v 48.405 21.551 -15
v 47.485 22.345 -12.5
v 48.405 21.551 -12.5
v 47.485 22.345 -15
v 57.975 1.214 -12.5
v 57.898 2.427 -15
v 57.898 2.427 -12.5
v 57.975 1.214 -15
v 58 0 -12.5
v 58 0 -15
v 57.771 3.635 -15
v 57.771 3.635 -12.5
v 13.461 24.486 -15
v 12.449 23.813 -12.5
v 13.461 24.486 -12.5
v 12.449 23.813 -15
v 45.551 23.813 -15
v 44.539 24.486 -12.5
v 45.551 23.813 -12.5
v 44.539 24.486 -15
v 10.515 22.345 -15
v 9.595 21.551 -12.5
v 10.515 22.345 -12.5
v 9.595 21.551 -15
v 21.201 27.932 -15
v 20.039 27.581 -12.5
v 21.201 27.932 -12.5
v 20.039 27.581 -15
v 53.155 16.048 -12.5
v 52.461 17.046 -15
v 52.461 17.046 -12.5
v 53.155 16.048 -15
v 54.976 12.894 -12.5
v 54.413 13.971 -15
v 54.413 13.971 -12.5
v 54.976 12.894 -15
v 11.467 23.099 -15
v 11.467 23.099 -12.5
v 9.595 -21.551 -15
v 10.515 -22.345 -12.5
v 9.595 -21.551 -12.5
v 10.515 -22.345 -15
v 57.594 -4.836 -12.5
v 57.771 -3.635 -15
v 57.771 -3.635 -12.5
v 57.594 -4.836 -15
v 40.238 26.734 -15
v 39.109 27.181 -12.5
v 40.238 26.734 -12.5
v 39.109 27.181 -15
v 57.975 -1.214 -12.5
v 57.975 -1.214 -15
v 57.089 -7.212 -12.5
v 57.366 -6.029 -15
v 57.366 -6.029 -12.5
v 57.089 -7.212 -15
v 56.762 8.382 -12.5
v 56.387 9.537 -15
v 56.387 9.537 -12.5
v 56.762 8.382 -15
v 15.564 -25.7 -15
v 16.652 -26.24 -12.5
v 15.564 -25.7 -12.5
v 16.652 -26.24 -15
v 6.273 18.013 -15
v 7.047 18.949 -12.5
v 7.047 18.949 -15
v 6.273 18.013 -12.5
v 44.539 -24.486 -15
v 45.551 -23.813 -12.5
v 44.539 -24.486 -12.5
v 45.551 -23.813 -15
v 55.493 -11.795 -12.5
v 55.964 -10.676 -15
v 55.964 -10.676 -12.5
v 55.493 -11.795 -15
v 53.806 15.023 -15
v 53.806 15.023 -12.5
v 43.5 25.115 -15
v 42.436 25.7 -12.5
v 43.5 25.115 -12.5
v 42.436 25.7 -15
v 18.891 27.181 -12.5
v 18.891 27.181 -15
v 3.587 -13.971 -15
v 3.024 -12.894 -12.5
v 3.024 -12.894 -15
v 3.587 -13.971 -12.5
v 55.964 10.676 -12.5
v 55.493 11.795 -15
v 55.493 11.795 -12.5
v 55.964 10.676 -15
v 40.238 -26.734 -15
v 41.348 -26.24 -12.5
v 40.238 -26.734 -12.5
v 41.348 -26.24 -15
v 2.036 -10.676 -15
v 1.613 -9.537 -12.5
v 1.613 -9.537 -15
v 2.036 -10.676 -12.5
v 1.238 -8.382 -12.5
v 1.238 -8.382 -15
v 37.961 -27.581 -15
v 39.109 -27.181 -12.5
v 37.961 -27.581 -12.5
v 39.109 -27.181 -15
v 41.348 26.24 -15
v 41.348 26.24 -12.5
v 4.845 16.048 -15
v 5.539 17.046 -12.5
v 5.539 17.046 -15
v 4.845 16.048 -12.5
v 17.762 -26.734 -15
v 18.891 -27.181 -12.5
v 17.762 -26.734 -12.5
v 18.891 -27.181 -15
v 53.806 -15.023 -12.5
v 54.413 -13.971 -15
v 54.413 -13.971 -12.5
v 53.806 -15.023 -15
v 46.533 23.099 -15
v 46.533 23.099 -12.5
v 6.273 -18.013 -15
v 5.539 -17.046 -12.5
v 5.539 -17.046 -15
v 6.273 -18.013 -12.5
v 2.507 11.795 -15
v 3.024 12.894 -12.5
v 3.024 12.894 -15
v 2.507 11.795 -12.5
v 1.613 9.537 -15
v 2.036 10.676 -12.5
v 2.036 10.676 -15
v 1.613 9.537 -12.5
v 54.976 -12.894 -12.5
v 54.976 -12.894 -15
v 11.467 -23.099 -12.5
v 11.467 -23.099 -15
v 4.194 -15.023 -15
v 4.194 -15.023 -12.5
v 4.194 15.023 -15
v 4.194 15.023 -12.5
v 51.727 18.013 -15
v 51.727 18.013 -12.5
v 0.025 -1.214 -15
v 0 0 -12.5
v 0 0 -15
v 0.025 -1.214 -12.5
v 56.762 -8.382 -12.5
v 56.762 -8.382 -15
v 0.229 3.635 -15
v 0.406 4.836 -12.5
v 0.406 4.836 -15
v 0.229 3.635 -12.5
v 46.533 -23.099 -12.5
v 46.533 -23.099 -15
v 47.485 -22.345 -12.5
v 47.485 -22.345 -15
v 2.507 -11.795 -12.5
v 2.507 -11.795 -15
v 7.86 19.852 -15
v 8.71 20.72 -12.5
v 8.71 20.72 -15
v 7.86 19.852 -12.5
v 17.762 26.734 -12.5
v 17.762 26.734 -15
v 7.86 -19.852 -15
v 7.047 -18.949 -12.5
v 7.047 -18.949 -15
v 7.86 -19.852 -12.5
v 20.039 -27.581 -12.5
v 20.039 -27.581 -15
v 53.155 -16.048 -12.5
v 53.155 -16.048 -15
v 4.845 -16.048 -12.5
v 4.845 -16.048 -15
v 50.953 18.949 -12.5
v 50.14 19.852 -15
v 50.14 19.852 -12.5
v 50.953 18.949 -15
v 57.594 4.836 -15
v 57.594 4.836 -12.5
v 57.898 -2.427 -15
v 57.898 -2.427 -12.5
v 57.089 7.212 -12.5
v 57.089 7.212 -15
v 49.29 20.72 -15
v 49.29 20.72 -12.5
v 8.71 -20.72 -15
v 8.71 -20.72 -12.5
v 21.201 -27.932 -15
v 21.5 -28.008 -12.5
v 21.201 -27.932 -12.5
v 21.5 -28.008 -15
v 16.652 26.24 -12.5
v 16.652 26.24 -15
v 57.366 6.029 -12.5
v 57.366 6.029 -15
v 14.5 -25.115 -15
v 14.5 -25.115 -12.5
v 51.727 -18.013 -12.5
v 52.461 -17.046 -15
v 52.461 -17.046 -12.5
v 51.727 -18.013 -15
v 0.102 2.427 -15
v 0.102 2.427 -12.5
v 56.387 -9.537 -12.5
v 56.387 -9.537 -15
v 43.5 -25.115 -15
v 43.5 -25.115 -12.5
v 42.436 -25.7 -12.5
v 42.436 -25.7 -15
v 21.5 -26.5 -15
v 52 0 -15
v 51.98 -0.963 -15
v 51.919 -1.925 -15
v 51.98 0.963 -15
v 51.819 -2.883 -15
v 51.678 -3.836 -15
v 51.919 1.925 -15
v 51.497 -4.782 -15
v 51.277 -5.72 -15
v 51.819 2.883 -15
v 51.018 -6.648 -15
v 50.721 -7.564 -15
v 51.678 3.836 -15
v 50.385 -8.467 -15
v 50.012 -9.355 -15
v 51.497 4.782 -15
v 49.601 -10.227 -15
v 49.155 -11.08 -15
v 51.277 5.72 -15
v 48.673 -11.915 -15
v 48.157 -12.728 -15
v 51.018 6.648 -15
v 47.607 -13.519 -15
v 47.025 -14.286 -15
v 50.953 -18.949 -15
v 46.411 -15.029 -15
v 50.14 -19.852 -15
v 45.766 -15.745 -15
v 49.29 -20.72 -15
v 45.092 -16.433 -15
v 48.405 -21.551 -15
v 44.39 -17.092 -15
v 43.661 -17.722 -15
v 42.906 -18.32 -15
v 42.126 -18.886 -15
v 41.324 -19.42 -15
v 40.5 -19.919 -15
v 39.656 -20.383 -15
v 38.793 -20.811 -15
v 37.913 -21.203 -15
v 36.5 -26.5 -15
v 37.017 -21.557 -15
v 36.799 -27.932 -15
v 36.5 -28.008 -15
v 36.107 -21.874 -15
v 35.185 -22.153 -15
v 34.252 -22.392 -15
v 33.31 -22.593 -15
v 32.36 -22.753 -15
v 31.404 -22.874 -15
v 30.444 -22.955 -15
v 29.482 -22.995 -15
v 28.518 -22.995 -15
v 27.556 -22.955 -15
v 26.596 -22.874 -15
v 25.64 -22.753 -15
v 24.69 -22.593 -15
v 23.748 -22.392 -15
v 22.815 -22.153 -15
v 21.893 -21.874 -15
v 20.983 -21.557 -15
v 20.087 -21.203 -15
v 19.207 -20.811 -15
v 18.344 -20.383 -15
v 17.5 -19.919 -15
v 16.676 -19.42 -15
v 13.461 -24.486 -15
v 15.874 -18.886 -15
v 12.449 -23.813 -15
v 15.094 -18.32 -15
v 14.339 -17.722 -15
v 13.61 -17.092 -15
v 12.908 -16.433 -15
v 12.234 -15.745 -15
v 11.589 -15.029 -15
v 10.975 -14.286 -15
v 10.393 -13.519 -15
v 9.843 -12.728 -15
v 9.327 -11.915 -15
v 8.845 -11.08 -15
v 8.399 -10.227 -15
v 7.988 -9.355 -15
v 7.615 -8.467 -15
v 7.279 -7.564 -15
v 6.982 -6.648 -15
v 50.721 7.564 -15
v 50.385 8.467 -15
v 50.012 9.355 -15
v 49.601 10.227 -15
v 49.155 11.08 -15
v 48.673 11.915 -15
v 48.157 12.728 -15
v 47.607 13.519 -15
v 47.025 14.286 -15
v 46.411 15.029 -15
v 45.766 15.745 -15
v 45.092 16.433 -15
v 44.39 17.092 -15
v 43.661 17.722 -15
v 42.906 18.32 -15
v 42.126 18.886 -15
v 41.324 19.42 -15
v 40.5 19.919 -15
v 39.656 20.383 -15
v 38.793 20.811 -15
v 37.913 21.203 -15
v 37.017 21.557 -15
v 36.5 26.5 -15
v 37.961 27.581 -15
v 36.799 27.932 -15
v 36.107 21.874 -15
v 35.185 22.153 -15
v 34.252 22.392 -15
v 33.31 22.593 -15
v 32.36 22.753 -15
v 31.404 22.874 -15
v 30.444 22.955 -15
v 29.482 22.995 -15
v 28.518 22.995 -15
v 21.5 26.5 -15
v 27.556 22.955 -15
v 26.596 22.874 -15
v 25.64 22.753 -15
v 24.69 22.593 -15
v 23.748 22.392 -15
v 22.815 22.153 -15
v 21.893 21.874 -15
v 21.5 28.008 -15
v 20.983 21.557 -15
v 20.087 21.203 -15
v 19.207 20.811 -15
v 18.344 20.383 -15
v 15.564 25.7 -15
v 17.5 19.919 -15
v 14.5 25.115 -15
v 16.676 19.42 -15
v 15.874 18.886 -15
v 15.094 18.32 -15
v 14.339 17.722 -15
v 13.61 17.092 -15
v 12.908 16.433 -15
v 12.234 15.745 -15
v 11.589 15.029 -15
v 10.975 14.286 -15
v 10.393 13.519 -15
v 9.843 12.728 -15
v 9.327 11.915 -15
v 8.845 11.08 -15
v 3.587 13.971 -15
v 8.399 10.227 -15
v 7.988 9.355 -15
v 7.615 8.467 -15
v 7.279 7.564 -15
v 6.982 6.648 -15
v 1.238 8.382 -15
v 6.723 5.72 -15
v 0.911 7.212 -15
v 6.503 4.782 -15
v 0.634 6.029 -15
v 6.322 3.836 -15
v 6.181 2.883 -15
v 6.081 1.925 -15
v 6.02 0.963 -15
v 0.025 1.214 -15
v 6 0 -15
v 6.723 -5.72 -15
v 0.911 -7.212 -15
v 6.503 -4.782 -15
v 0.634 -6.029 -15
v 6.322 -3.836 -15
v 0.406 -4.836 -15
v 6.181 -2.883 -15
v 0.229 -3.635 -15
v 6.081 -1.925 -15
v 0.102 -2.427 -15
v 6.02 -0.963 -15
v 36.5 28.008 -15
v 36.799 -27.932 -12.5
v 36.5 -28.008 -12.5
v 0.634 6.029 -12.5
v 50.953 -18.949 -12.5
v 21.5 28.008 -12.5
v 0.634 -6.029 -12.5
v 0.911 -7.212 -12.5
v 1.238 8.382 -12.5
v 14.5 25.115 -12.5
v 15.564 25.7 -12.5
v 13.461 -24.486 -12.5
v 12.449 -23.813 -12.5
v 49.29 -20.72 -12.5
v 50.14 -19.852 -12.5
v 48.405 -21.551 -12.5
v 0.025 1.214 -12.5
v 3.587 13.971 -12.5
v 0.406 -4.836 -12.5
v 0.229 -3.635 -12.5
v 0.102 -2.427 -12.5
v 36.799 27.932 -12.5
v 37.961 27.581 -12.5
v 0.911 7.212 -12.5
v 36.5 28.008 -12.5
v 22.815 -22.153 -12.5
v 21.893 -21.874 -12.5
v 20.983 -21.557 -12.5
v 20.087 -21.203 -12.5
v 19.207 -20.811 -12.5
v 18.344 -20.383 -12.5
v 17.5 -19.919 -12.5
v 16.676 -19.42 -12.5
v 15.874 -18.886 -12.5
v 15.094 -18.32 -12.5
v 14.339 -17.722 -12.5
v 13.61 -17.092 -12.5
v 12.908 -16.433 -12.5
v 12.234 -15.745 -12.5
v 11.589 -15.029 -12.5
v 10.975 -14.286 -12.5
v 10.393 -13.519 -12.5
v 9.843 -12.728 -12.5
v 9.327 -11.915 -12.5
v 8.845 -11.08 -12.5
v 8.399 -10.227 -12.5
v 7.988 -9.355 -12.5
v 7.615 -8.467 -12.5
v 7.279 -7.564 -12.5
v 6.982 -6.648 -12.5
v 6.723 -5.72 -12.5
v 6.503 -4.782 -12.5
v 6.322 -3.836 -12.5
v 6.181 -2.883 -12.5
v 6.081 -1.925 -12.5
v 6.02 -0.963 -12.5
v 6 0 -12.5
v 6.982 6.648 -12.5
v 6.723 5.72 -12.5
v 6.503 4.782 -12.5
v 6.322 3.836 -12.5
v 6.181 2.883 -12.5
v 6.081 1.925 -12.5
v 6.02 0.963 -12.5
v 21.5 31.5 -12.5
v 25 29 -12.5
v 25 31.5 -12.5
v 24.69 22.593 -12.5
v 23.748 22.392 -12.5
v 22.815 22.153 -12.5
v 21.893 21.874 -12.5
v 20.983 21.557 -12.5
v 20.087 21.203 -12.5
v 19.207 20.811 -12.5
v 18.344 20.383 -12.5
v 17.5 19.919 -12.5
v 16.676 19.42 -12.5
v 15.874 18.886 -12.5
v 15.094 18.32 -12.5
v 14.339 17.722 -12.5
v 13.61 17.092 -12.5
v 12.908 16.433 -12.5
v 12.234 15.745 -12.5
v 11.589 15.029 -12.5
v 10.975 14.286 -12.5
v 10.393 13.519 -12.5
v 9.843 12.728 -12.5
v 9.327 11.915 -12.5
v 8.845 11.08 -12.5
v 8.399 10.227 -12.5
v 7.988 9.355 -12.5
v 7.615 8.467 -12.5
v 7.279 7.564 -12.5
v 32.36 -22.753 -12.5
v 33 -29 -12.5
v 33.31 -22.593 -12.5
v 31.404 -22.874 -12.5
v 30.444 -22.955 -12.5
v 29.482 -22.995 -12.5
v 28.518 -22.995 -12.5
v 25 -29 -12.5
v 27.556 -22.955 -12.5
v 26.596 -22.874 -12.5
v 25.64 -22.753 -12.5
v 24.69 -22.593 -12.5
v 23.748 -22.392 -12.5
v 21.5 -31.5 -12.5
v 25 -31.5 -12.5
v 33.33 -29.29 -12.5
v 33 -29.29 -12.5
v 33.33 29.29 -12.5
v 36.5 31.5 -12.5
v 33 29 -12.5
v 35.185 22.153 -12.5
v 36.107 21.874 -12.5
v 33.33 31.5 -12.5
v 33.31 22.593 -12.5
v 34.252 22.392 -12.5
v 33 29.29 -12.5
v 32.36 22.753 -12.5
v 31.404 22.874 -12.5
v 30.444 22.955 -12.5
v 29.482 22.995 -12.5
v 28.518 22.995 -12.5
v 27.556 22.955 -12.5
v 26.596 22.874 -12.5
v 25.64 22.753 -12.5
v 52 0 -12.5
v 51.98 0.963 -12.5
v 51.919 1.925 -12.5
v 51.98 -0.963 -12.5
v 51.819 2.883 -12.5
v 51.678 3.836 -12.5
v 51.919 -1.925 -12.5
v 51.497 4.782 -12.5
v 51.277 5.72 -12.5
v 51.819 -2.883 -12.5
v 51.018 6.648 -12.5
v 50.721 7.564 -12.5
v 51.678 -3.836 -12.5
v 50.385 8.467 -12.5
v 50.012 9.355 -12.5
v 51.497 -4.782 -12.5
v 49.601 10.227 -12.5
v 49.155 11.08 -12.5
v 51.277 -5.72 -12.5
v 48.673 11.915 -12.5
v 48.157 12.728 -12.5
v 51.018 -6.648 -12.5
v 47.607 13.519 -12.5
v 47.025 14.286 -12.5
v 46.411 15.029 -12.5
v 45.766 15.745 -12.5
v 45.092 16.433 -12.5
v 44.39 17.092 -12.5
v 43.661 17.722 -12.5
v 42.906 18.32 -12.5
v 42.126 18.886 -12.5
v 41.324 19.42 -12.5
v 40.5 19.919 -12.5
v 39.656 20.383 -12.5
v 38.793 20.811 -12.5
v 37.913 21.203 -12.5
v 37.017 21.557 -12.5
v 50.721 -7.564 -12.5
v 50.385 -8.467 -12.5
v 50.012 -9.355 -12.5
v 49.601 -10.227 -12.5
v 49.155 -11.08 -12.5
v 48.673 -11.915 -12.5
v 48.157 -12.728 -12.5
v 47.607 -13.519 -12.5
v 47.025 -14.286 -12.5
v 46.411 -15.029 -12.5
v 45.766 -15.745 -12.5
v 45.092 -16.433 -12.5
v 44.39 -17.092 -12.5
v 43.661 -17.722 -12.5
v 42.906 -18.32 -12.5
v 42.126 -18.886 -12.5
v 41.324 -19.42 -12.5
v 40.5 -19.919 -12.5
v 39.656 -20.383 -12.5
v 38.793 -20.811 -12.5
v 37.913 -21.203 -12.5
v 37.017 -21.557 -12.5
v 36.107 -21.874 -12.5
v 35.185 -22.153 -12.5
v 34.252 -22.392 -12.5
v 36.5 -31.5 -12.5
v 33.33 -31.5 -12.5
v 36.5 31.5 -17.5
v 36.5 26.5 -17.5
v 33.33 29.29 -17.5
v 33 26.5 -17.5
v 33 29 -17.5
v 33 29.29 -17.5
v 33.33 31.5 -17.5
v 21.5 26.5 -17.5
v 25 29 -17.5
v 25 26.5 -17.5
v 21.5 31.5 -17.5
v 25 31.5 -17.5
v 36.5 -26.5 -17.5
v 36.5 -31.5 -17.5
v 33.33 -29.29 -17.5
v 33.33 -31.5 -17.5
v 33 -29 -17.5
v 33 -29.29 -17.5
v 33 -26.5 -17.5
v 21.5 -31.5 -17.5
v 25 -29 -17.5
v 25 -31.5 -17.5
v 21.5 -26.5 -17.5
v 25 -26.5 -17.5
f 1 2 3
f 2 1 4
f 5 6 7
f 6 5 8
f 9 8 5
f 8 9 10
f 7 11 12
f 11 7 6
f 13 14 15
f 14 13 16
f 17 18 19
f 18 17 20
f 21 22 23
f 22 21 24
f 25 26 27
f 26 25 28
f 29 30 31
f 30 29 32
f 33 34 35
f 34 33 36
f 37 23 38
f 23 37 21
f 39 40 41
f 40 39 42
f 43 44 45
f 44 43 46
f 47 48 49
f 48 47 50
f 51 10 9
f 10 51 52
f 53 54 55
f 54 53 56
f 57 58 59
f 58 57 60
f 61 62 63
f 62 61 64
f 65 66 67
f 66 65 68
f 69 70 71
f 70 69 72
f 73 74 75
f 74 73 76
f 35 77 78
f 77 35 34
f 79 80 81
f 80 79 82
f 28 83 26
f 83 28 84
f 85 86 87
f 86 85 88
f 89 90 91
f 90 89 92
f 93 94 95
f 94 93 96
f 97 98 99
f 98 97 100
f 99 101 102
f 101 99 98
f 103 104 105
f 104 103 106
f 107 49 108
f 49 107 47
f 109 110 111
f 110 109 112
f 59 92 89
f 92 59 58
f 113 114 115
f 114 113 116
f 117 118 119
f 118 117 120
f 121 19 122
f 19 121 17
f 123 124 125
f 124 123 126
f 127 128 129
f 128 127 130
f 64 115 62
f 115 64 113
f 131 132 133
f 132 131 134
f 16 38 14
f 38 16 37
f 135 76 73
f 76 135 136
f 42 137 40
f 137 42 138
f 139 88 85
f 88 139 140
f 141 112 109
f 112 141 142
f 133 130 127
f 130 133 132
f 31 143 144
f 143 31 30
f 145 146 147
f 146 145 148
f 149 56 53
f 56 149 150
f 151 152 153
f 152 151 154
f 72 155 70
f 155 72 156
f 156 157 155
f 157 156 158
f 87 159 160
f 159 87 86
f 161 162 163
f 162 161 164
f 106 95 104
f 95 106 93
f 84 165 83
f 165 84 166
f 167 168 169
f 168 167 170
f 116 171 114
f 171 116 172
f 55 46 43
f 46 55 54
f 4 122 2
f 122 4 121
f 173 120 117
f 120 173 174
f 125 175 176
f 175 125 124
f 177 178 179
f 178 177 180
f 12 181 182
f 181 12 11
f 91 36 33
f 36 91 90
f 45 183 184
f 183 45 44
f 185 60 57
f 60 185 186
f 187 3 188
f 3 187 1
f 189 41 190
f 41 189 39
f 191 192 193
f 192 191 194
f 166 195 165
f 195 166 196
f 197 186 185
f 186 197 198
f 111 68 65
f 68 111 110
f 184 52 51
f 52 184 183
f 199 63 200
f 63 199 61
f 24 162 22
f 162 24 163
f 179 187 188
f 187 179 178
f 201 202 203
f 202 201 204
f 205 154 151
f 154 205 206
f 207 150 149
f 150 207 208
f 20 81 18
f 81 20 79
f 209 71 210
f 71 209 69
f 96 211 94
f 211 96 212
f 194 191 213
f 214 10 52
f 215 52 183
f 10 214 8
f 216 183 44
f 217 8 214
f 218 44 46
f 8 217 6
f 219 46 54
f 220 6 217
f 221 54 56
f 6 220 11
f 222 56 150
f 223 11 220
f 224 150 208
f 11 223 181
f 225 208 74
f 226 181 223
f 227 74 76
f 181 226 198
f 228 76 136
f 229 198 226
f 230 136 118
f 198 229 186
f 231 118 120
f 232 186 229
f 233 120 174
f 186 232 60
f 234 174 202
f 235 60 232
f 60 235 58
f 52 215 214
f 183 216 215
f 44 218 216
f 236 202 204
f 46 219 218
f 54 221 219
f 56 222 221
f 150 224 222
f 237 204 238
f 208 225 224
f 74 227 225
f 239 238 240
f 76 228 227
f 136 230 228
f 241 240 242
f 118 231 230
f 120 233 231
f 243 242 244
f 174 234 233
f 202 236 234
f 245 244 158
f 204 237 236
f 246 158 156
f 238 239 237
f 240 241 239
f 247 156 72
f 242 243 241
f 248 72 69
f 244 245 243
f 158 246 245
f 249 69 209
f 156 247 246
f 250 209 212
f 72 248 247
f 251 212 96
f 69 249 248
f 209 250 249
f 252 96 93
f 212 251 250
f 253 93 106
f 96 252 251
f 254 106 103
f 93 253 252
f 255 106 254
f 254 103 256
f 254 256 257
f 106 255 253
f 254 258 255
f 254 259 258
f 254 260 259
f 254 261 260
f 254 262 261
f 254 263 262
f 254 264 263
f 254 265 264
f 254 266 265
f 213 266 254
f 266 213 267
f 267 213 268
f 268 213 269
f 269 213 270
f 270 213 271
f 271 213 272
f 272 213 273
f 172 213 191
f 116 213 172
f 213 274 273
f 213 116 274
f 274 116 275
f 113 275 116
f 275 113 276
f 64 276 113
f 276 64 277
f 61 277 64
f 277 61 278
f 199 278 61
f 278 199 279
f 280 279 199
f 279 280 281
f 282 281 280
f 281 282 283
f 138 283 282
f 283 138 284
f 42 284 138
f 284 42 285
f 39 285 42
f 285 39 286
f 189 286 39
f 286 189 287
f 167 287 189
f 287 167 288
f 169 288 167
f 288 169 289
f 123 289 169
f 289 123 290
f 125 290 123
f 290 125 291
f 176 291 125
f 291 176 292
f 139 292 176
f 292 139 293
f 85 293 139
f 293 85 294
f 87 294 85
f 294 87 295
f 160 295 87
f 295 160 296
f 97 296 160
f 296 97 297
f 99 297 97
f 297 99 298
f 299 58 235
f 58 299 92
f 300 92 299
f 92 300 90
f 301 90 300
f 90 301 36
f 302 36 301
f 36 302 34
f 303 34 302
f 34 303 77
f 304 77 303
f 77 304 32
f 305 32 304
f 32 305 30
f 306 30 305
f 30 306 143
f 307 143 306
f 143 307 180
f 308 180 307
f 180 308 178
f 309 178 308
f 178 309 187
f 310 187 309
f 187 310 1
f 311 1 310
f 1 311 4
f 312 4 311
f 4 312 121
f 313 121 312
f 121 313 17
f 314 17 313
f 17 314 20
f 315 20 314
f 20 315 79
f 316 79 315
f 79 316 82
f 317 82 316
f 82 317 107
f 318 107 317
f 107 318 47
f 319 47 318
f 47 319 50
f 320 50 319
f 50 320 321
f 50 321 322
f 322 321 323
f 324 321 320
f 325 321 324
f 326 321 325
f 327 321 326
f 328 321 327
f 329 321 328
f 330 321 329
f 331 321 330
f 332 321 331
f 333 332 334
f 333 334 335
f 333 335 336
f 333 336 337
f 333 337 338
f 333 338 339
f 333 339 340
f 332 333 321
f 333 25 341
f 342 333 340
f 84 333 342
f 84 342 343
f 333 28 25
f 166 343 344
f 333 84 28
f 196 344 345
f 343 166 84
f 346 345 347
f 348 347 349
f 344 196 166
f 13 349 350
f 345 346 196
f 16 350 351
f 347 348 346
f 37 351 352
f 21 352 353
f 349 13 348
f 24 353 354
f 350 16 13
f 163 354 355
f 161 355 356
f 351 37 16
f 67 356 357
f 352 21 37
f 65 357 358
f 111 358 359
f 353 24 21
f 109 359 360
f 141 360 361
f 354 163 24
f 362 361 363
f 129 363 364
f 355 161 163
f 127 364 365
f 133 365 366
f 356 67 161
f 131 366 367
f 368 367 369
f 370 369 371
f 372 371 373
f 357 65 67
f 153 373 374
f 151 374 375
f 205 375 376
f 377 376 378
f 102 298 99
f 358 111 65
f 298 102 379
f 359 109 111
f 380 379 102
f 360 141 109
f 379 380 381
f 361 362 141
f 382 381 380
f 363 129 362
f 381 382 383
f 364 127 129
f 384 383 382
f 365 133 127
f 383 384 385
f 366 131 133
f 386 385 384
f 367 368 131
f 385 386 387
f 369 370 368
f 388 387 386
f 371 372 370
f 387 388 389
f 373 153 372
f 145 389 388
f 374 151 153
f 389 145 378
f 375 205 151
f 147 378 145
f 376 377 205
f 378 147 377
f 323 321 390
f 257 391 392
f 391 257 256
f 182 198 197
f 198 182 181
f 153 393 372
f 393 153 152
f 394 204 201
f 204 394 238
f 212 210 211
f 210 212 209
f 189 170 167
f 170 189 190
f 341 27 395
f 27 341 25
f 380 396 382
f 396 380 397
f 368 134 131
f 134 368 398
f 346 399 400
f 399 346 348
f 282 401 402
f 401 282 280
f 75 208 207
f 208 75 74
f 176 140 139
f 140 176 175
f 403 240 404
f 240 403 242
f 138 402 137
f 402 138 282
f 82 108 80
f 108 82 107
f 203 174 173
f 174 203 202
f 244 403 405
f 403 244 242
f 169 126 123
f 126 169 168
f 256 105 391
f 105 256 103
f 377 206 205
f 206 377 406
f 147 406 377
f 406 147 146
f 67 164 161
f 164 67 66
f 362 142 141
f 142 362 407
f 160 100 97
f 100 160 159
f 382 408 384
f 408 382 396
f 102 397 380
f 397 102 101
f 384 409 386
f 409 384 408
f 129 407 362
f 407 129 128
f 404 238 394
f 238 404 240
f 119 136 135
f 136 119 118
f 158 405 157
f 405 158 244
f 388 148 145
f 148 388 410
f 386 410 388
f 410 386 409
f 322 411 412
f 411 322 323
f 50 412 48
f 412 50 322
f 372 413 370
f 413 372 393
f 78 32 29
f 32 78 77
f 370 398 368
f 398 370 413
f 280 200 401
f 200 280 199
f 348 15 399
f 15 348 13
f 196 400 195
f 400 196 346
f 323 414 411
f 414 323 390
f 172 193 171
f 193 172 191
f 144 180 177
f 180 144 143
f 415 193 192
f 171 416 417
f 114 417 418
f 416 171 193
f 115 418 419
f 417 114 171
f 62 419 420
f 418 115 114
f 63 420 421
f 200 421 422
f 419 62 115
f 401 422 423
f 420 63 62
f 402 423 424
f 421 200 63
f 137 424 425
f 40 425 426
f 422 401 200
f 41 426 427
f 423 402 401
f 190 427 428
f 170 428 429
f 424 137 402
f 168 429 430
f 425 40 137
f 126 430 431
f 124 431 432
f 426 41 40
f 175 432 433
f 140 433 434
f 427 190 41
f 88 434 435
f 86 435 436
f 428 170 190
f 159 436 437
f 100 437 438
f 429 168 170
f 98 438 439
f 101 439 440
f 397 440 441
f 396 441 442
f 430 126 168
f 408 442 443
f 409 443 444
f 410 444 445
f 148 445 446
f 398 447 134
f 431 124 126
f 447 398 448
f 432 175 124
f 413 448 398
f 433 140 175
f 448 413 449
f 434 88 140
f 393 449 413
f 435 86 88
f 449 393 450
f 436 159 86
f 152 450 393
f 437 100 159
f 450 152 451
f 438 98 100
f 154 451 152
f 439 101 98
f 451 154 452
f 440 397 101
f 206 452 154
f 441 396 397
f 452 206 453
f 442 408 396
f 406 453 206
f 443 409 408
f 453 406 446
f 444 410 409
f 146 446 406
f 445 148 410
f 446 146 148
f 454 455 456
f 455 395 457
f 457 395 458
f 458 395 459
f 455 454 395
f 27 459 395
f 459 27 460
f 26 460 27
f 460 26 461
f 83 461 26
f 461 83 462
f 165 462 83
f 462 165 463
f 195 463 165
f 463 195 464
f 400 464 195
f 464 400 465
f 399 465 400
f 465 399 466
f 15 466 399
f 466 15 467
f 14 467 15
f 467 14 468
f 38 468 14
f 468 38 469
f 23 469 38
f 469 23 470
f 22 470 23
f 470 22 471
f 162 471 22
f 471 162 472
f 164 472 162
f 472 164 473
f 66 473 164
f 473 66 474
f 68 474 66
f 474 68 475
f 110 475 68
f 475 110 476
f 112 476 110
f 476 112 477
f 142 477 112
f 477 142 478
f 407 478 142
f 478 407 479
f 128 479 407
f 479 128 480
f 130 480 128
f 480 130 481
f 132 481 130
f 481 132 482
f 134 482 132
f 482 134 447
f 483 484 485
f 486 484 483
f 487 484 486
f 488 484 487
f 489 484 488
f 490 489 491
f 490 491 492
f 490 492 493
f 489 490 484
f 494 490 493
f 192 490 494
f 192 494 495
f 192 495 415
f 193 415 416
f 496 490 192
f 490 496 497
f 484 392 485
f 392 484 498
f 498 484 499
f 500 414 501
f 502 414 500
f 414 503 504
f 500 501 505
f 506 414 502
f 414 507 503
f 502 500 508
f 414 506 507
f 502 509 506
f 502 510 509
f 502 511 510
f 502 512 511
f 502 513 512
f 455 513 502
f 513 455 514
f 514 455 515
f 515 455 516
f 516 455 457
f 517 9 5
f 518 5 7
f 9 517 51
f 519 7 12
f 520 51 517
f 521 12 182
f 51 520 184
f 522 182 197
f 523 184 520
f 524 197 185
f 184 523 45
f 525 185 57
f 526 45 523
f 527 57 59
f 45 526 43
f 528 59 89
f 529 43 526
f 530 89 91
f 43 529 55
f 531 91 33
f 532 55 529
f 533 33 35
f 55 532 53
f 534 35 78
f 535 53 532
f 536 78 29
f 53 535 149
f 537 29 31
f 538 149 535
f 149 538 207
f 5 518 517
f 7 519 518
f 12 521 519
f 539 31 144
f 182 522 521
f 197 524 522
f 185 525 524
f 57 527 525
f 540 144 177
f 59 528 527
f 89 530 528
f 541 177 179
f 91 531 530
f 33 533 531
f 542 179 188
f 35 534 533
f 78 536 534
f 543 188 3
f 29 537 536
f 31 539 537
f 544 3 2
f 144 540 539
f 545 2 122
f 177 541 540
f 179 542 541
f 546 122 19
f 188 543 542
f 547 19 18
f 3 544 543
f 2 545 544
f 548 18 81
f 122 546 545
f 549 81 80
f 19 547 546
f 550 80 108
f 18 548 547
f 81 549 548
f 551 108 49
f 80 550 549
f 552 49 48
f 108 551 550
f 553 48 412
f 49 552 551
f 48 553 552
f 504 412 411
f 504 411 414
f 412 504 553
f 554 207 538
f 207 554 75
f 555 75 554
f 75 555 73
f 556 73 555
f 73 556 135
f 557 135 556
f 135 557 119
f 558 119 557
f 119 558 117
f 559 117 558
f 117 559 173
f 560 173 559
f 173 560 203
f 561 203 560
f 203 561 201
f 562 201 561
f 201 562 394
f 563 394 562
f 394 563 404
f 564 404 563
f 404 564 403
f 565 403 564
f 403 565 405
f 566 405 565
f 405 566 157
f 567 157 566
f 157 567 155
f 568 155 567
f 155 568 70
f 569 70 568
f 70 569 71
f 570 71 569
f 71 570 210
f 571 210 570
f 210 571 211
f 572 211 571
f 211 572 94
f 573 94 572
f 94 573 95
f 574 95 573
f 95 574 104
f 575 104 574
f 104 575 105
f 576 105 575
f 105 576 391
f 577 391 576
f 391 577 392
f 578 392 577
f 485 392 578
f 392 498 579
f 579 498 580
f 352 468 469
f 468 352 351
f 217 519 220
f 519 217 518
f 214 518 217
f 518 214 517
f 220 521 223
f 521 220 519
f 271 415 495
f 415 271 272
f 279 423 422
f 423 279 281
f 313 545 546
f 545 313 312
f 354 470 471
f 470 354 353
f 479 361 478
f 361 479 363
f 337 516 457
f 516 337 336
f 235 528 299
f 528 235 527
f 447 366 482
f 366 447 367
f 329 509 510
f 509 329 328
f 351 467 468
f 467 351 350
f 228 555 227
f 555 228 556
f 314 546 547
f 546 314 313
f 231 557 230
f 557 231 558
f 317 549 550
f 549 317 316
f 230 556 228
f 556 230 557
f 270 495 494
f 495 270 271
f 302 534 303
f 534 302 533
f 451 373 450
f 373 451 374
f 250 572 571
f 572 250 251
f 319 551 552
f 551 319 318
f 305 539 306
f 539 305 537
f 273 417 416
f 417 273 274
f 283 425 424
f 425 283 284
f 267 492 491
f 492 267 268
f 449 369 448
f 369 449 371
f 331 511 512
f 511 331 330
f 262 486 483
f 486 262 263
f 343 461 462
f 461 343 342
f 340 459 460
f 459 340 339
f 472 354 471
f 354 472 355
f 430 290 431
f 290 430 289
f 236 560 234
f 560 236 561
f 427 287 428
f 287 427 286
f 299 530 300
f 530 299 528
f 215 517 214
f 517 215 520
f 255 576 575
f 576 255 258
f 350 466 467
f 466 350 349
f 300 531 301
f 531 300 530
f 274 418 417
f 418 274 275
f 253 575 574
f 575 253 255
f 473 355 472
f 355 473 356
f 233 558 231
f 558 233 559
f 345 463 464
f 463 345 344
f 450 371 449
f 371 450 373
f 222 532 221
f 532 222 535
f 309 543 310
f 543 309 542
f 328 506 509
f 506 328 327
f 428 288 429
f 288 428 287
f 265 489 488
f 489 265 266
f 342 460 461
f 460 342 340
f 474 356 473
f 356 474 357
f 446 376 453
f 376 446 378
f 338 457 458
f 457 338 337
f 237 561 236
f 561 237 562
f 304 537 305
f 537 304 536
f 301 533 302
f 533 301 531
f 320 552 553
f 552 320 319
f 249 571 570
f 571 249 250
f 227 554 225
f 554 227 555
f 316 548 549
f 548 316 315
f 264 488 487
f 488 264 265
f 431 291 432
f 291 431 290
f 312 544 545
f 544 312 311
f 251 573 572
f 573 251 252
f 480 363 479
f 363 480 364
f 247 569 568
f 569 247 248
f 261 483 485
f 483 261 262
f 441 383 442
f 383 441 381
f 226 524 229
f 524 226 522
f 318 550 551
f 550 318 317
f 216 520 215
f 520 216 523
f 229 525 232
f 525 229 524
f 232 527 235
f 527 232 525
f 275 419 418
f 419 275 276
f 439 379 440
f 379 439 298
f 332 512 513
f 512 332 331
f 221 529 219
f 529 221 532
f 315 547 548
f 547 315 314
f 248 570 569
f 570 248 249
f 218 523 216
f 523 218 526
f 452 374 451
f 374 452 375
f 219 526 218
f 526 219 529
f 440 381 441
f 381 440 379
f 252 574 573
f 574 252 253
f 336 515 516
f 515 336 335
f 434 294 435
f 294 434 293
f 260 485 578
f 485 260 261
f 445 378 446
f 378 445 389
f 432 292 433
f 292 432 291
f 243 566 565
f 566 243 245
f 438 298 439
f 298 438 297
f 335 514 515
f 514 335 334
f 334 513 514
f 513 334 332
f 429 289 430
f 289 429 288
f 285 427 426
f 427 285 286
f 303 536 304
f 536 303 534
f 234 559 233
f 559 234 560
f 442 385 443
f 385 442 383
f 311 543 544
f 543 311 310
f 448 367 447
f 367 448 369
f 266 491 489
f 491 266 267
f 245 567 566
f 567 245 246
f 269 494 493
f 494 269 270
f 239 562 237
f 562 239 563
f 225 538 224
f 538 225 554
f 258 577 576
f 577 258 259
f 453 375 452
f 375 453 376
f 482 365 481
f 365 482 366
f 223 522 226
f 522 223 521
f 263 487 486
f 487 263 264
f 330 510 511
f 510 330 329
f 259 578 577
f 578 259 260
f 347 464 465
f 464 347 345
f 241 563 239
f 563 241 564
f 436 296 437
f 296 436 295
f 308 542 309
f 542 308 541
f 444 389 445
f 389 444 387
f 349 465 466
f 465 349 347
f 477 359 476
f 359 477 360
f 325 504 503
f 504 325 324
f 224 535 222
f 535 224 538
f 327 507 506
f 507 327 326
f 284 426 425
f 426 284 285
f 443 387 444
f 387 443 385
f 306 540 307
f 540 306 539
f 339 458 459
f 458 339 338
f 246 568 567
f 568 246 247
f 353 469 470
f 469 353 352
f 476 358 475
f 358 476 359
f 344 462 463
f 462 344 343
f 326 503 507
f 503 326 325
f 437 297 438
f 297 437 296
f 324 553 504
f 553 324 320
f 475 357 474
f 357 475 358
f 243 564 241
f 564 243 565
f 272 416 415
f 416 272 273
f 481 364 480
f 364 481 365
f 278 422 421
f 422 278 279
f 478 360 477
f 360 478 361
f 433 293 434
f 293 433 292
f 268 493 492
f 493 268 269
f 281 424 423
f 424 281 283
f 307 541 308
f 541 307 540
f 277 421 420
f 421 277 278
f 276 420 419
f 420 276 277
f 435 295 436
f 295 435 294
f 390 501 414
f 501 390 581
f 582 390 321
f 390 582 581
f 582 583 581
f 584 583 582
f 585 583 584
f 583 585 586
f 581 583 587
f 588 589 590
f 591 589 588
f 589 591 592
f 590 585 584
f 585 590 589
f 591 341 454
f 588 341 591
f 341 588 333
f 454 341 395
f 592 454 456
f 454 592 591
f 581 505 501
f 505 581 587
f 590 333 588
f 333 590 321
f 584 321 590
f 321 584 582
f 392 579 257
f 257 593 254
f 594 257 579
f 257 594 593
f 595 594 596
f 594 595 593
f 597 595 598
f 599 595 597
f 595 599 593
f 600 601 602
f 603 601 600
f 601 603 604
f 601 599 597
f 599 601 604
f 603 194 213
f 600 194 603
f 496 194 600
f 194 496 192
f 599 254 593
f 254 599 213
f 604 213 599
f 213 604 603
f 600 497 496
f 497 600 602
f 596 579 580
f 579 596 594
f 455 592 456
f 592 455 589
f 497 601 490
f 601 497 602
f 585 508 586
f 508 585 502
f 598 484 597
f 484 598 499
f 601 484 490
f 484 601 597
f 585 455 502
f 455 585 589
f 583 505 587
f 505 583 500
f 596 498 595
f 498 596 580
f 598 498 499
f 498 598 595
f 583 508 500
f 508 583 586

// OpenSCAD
$fn=150;

BRETT_THICKNESS = 10;
BRETT_WIDTH = 46;
module brett() {
  translate([0, -BRETT_WIDTH/2, 0]) cube([300, BRETT_WIDTH, BRETT_THICKNESS]); // Wiege Brett
}

RING_THICKNESS = 2.5;
RING_OUTER = 58;
module adapter() {
  module adapter_notch() {
    CLIP_BASE_WIDTH = 15;
    CLIP_BASE_THICKNESS = RING_THICKNESS*2;
    CLIP_BASE_HEIGHT = 5;
    translate([-CLIP_BASE_WIDTH/2, -RING_OUTER/2-CLIP_BASE_HEIGHT/2, -CLIP_BASE_THICKNESS/2])
      cube([CLIP_BASE_WIDTH, CLIP_BASE_HEIGHT, CLIP_BASE_THICKNESS]);
  }
  YICAM_SPACE = 12.5;
  translate([0, 0, -YICAM_SPACE]) //Platz zwischen Adapter und Brett für yicam Gehäuse
    translate([RING_OUTER/2, 0, -2.5]) {

      difference() {
        cylinder(h=RING_THICKNESS, d=RING_OUTER);
        translate([0, 0, -RING_THICKNESS]) cylinder(h=7.5, d=46);
      }

mirror([0, 1, 0]) adapter_notch();
adapter_notch();
    }
}

CLIP_THICKNESS = 2.5;
CLIP_WIDTH = 8;
module clip() {
  module hook() {
    cube([CLIP_WIDTH, CLIP_THICKNESS, BRETT_THICKNESS]);
    translate([0, -(RING_OUTER/2-BRETT_WIDTH/2), 0]) {
      translate([0, 0, BRETT_THICKNESS]) cube([CLIP_WIDTH, CLIP_THICKNESS, CLIP_SPACE+RING_THICKNESS*2]);
      translate([0, CLIP_THICKNESS, BRETT_THICKNESS]) cube([CLIP_WIDTH, RING_OUTER/2-BRETT_WIDTH/2, CLIP_THICKNESS]);
      translate([0, 0, CLIP_SPACE+BRETT_THICKNESS+RING_THICKNESS*2]) cube([CLIP_WIDTH, CLIP_THICKNESS*2, CLIP_THICKNESS]);
    }
  }
  CLIP_HEIGHT = BRETT_WIDTH+2*CLIP_THICKNESS;
  CLIP_SPACE = 12.5;
  cube([CLIP_WIDTH, CLIP_HEIGHT, CLIP_THICKNESS]);
  translate([0, 0, CLIP_THICKNESS]) {
    translate([0, CLIP_HEIGHT, 0]) mirror([0, 1, 0]) hook();
    hook();
  }
}

/**
translate([RING_OUTER/2+CLIP_WIDTH/2, -BRETT_WIDTH/2-CLIP_THICKNESS, BRETT_THICKNESS+CLIP_THICKNESS]) rotate([0, 90, 0]) scale([0.99, 1.01, 1.01]) clip();
**/

/*brett();*/

difference() {
adapter();
scale([1.01, 1.01, 1.01]) translate([RING_OUTER/2+CLIP_WIDTH/2, -BRETT_WIDTH/2-CLIP_THICKNESS, BRETT_THICKNESS+CLIP_THICKNESS]) rotate([0, 180, 0]) clip();
translate([RING_OUTER/2+CLIP_WIDTH/2, -BRETT_WIDTH/2-CLIP_THICKNESS, BRETT_THICKNESS+CLIP_THICKNESS]) rotate([0, 180, 0]) clip();
}
